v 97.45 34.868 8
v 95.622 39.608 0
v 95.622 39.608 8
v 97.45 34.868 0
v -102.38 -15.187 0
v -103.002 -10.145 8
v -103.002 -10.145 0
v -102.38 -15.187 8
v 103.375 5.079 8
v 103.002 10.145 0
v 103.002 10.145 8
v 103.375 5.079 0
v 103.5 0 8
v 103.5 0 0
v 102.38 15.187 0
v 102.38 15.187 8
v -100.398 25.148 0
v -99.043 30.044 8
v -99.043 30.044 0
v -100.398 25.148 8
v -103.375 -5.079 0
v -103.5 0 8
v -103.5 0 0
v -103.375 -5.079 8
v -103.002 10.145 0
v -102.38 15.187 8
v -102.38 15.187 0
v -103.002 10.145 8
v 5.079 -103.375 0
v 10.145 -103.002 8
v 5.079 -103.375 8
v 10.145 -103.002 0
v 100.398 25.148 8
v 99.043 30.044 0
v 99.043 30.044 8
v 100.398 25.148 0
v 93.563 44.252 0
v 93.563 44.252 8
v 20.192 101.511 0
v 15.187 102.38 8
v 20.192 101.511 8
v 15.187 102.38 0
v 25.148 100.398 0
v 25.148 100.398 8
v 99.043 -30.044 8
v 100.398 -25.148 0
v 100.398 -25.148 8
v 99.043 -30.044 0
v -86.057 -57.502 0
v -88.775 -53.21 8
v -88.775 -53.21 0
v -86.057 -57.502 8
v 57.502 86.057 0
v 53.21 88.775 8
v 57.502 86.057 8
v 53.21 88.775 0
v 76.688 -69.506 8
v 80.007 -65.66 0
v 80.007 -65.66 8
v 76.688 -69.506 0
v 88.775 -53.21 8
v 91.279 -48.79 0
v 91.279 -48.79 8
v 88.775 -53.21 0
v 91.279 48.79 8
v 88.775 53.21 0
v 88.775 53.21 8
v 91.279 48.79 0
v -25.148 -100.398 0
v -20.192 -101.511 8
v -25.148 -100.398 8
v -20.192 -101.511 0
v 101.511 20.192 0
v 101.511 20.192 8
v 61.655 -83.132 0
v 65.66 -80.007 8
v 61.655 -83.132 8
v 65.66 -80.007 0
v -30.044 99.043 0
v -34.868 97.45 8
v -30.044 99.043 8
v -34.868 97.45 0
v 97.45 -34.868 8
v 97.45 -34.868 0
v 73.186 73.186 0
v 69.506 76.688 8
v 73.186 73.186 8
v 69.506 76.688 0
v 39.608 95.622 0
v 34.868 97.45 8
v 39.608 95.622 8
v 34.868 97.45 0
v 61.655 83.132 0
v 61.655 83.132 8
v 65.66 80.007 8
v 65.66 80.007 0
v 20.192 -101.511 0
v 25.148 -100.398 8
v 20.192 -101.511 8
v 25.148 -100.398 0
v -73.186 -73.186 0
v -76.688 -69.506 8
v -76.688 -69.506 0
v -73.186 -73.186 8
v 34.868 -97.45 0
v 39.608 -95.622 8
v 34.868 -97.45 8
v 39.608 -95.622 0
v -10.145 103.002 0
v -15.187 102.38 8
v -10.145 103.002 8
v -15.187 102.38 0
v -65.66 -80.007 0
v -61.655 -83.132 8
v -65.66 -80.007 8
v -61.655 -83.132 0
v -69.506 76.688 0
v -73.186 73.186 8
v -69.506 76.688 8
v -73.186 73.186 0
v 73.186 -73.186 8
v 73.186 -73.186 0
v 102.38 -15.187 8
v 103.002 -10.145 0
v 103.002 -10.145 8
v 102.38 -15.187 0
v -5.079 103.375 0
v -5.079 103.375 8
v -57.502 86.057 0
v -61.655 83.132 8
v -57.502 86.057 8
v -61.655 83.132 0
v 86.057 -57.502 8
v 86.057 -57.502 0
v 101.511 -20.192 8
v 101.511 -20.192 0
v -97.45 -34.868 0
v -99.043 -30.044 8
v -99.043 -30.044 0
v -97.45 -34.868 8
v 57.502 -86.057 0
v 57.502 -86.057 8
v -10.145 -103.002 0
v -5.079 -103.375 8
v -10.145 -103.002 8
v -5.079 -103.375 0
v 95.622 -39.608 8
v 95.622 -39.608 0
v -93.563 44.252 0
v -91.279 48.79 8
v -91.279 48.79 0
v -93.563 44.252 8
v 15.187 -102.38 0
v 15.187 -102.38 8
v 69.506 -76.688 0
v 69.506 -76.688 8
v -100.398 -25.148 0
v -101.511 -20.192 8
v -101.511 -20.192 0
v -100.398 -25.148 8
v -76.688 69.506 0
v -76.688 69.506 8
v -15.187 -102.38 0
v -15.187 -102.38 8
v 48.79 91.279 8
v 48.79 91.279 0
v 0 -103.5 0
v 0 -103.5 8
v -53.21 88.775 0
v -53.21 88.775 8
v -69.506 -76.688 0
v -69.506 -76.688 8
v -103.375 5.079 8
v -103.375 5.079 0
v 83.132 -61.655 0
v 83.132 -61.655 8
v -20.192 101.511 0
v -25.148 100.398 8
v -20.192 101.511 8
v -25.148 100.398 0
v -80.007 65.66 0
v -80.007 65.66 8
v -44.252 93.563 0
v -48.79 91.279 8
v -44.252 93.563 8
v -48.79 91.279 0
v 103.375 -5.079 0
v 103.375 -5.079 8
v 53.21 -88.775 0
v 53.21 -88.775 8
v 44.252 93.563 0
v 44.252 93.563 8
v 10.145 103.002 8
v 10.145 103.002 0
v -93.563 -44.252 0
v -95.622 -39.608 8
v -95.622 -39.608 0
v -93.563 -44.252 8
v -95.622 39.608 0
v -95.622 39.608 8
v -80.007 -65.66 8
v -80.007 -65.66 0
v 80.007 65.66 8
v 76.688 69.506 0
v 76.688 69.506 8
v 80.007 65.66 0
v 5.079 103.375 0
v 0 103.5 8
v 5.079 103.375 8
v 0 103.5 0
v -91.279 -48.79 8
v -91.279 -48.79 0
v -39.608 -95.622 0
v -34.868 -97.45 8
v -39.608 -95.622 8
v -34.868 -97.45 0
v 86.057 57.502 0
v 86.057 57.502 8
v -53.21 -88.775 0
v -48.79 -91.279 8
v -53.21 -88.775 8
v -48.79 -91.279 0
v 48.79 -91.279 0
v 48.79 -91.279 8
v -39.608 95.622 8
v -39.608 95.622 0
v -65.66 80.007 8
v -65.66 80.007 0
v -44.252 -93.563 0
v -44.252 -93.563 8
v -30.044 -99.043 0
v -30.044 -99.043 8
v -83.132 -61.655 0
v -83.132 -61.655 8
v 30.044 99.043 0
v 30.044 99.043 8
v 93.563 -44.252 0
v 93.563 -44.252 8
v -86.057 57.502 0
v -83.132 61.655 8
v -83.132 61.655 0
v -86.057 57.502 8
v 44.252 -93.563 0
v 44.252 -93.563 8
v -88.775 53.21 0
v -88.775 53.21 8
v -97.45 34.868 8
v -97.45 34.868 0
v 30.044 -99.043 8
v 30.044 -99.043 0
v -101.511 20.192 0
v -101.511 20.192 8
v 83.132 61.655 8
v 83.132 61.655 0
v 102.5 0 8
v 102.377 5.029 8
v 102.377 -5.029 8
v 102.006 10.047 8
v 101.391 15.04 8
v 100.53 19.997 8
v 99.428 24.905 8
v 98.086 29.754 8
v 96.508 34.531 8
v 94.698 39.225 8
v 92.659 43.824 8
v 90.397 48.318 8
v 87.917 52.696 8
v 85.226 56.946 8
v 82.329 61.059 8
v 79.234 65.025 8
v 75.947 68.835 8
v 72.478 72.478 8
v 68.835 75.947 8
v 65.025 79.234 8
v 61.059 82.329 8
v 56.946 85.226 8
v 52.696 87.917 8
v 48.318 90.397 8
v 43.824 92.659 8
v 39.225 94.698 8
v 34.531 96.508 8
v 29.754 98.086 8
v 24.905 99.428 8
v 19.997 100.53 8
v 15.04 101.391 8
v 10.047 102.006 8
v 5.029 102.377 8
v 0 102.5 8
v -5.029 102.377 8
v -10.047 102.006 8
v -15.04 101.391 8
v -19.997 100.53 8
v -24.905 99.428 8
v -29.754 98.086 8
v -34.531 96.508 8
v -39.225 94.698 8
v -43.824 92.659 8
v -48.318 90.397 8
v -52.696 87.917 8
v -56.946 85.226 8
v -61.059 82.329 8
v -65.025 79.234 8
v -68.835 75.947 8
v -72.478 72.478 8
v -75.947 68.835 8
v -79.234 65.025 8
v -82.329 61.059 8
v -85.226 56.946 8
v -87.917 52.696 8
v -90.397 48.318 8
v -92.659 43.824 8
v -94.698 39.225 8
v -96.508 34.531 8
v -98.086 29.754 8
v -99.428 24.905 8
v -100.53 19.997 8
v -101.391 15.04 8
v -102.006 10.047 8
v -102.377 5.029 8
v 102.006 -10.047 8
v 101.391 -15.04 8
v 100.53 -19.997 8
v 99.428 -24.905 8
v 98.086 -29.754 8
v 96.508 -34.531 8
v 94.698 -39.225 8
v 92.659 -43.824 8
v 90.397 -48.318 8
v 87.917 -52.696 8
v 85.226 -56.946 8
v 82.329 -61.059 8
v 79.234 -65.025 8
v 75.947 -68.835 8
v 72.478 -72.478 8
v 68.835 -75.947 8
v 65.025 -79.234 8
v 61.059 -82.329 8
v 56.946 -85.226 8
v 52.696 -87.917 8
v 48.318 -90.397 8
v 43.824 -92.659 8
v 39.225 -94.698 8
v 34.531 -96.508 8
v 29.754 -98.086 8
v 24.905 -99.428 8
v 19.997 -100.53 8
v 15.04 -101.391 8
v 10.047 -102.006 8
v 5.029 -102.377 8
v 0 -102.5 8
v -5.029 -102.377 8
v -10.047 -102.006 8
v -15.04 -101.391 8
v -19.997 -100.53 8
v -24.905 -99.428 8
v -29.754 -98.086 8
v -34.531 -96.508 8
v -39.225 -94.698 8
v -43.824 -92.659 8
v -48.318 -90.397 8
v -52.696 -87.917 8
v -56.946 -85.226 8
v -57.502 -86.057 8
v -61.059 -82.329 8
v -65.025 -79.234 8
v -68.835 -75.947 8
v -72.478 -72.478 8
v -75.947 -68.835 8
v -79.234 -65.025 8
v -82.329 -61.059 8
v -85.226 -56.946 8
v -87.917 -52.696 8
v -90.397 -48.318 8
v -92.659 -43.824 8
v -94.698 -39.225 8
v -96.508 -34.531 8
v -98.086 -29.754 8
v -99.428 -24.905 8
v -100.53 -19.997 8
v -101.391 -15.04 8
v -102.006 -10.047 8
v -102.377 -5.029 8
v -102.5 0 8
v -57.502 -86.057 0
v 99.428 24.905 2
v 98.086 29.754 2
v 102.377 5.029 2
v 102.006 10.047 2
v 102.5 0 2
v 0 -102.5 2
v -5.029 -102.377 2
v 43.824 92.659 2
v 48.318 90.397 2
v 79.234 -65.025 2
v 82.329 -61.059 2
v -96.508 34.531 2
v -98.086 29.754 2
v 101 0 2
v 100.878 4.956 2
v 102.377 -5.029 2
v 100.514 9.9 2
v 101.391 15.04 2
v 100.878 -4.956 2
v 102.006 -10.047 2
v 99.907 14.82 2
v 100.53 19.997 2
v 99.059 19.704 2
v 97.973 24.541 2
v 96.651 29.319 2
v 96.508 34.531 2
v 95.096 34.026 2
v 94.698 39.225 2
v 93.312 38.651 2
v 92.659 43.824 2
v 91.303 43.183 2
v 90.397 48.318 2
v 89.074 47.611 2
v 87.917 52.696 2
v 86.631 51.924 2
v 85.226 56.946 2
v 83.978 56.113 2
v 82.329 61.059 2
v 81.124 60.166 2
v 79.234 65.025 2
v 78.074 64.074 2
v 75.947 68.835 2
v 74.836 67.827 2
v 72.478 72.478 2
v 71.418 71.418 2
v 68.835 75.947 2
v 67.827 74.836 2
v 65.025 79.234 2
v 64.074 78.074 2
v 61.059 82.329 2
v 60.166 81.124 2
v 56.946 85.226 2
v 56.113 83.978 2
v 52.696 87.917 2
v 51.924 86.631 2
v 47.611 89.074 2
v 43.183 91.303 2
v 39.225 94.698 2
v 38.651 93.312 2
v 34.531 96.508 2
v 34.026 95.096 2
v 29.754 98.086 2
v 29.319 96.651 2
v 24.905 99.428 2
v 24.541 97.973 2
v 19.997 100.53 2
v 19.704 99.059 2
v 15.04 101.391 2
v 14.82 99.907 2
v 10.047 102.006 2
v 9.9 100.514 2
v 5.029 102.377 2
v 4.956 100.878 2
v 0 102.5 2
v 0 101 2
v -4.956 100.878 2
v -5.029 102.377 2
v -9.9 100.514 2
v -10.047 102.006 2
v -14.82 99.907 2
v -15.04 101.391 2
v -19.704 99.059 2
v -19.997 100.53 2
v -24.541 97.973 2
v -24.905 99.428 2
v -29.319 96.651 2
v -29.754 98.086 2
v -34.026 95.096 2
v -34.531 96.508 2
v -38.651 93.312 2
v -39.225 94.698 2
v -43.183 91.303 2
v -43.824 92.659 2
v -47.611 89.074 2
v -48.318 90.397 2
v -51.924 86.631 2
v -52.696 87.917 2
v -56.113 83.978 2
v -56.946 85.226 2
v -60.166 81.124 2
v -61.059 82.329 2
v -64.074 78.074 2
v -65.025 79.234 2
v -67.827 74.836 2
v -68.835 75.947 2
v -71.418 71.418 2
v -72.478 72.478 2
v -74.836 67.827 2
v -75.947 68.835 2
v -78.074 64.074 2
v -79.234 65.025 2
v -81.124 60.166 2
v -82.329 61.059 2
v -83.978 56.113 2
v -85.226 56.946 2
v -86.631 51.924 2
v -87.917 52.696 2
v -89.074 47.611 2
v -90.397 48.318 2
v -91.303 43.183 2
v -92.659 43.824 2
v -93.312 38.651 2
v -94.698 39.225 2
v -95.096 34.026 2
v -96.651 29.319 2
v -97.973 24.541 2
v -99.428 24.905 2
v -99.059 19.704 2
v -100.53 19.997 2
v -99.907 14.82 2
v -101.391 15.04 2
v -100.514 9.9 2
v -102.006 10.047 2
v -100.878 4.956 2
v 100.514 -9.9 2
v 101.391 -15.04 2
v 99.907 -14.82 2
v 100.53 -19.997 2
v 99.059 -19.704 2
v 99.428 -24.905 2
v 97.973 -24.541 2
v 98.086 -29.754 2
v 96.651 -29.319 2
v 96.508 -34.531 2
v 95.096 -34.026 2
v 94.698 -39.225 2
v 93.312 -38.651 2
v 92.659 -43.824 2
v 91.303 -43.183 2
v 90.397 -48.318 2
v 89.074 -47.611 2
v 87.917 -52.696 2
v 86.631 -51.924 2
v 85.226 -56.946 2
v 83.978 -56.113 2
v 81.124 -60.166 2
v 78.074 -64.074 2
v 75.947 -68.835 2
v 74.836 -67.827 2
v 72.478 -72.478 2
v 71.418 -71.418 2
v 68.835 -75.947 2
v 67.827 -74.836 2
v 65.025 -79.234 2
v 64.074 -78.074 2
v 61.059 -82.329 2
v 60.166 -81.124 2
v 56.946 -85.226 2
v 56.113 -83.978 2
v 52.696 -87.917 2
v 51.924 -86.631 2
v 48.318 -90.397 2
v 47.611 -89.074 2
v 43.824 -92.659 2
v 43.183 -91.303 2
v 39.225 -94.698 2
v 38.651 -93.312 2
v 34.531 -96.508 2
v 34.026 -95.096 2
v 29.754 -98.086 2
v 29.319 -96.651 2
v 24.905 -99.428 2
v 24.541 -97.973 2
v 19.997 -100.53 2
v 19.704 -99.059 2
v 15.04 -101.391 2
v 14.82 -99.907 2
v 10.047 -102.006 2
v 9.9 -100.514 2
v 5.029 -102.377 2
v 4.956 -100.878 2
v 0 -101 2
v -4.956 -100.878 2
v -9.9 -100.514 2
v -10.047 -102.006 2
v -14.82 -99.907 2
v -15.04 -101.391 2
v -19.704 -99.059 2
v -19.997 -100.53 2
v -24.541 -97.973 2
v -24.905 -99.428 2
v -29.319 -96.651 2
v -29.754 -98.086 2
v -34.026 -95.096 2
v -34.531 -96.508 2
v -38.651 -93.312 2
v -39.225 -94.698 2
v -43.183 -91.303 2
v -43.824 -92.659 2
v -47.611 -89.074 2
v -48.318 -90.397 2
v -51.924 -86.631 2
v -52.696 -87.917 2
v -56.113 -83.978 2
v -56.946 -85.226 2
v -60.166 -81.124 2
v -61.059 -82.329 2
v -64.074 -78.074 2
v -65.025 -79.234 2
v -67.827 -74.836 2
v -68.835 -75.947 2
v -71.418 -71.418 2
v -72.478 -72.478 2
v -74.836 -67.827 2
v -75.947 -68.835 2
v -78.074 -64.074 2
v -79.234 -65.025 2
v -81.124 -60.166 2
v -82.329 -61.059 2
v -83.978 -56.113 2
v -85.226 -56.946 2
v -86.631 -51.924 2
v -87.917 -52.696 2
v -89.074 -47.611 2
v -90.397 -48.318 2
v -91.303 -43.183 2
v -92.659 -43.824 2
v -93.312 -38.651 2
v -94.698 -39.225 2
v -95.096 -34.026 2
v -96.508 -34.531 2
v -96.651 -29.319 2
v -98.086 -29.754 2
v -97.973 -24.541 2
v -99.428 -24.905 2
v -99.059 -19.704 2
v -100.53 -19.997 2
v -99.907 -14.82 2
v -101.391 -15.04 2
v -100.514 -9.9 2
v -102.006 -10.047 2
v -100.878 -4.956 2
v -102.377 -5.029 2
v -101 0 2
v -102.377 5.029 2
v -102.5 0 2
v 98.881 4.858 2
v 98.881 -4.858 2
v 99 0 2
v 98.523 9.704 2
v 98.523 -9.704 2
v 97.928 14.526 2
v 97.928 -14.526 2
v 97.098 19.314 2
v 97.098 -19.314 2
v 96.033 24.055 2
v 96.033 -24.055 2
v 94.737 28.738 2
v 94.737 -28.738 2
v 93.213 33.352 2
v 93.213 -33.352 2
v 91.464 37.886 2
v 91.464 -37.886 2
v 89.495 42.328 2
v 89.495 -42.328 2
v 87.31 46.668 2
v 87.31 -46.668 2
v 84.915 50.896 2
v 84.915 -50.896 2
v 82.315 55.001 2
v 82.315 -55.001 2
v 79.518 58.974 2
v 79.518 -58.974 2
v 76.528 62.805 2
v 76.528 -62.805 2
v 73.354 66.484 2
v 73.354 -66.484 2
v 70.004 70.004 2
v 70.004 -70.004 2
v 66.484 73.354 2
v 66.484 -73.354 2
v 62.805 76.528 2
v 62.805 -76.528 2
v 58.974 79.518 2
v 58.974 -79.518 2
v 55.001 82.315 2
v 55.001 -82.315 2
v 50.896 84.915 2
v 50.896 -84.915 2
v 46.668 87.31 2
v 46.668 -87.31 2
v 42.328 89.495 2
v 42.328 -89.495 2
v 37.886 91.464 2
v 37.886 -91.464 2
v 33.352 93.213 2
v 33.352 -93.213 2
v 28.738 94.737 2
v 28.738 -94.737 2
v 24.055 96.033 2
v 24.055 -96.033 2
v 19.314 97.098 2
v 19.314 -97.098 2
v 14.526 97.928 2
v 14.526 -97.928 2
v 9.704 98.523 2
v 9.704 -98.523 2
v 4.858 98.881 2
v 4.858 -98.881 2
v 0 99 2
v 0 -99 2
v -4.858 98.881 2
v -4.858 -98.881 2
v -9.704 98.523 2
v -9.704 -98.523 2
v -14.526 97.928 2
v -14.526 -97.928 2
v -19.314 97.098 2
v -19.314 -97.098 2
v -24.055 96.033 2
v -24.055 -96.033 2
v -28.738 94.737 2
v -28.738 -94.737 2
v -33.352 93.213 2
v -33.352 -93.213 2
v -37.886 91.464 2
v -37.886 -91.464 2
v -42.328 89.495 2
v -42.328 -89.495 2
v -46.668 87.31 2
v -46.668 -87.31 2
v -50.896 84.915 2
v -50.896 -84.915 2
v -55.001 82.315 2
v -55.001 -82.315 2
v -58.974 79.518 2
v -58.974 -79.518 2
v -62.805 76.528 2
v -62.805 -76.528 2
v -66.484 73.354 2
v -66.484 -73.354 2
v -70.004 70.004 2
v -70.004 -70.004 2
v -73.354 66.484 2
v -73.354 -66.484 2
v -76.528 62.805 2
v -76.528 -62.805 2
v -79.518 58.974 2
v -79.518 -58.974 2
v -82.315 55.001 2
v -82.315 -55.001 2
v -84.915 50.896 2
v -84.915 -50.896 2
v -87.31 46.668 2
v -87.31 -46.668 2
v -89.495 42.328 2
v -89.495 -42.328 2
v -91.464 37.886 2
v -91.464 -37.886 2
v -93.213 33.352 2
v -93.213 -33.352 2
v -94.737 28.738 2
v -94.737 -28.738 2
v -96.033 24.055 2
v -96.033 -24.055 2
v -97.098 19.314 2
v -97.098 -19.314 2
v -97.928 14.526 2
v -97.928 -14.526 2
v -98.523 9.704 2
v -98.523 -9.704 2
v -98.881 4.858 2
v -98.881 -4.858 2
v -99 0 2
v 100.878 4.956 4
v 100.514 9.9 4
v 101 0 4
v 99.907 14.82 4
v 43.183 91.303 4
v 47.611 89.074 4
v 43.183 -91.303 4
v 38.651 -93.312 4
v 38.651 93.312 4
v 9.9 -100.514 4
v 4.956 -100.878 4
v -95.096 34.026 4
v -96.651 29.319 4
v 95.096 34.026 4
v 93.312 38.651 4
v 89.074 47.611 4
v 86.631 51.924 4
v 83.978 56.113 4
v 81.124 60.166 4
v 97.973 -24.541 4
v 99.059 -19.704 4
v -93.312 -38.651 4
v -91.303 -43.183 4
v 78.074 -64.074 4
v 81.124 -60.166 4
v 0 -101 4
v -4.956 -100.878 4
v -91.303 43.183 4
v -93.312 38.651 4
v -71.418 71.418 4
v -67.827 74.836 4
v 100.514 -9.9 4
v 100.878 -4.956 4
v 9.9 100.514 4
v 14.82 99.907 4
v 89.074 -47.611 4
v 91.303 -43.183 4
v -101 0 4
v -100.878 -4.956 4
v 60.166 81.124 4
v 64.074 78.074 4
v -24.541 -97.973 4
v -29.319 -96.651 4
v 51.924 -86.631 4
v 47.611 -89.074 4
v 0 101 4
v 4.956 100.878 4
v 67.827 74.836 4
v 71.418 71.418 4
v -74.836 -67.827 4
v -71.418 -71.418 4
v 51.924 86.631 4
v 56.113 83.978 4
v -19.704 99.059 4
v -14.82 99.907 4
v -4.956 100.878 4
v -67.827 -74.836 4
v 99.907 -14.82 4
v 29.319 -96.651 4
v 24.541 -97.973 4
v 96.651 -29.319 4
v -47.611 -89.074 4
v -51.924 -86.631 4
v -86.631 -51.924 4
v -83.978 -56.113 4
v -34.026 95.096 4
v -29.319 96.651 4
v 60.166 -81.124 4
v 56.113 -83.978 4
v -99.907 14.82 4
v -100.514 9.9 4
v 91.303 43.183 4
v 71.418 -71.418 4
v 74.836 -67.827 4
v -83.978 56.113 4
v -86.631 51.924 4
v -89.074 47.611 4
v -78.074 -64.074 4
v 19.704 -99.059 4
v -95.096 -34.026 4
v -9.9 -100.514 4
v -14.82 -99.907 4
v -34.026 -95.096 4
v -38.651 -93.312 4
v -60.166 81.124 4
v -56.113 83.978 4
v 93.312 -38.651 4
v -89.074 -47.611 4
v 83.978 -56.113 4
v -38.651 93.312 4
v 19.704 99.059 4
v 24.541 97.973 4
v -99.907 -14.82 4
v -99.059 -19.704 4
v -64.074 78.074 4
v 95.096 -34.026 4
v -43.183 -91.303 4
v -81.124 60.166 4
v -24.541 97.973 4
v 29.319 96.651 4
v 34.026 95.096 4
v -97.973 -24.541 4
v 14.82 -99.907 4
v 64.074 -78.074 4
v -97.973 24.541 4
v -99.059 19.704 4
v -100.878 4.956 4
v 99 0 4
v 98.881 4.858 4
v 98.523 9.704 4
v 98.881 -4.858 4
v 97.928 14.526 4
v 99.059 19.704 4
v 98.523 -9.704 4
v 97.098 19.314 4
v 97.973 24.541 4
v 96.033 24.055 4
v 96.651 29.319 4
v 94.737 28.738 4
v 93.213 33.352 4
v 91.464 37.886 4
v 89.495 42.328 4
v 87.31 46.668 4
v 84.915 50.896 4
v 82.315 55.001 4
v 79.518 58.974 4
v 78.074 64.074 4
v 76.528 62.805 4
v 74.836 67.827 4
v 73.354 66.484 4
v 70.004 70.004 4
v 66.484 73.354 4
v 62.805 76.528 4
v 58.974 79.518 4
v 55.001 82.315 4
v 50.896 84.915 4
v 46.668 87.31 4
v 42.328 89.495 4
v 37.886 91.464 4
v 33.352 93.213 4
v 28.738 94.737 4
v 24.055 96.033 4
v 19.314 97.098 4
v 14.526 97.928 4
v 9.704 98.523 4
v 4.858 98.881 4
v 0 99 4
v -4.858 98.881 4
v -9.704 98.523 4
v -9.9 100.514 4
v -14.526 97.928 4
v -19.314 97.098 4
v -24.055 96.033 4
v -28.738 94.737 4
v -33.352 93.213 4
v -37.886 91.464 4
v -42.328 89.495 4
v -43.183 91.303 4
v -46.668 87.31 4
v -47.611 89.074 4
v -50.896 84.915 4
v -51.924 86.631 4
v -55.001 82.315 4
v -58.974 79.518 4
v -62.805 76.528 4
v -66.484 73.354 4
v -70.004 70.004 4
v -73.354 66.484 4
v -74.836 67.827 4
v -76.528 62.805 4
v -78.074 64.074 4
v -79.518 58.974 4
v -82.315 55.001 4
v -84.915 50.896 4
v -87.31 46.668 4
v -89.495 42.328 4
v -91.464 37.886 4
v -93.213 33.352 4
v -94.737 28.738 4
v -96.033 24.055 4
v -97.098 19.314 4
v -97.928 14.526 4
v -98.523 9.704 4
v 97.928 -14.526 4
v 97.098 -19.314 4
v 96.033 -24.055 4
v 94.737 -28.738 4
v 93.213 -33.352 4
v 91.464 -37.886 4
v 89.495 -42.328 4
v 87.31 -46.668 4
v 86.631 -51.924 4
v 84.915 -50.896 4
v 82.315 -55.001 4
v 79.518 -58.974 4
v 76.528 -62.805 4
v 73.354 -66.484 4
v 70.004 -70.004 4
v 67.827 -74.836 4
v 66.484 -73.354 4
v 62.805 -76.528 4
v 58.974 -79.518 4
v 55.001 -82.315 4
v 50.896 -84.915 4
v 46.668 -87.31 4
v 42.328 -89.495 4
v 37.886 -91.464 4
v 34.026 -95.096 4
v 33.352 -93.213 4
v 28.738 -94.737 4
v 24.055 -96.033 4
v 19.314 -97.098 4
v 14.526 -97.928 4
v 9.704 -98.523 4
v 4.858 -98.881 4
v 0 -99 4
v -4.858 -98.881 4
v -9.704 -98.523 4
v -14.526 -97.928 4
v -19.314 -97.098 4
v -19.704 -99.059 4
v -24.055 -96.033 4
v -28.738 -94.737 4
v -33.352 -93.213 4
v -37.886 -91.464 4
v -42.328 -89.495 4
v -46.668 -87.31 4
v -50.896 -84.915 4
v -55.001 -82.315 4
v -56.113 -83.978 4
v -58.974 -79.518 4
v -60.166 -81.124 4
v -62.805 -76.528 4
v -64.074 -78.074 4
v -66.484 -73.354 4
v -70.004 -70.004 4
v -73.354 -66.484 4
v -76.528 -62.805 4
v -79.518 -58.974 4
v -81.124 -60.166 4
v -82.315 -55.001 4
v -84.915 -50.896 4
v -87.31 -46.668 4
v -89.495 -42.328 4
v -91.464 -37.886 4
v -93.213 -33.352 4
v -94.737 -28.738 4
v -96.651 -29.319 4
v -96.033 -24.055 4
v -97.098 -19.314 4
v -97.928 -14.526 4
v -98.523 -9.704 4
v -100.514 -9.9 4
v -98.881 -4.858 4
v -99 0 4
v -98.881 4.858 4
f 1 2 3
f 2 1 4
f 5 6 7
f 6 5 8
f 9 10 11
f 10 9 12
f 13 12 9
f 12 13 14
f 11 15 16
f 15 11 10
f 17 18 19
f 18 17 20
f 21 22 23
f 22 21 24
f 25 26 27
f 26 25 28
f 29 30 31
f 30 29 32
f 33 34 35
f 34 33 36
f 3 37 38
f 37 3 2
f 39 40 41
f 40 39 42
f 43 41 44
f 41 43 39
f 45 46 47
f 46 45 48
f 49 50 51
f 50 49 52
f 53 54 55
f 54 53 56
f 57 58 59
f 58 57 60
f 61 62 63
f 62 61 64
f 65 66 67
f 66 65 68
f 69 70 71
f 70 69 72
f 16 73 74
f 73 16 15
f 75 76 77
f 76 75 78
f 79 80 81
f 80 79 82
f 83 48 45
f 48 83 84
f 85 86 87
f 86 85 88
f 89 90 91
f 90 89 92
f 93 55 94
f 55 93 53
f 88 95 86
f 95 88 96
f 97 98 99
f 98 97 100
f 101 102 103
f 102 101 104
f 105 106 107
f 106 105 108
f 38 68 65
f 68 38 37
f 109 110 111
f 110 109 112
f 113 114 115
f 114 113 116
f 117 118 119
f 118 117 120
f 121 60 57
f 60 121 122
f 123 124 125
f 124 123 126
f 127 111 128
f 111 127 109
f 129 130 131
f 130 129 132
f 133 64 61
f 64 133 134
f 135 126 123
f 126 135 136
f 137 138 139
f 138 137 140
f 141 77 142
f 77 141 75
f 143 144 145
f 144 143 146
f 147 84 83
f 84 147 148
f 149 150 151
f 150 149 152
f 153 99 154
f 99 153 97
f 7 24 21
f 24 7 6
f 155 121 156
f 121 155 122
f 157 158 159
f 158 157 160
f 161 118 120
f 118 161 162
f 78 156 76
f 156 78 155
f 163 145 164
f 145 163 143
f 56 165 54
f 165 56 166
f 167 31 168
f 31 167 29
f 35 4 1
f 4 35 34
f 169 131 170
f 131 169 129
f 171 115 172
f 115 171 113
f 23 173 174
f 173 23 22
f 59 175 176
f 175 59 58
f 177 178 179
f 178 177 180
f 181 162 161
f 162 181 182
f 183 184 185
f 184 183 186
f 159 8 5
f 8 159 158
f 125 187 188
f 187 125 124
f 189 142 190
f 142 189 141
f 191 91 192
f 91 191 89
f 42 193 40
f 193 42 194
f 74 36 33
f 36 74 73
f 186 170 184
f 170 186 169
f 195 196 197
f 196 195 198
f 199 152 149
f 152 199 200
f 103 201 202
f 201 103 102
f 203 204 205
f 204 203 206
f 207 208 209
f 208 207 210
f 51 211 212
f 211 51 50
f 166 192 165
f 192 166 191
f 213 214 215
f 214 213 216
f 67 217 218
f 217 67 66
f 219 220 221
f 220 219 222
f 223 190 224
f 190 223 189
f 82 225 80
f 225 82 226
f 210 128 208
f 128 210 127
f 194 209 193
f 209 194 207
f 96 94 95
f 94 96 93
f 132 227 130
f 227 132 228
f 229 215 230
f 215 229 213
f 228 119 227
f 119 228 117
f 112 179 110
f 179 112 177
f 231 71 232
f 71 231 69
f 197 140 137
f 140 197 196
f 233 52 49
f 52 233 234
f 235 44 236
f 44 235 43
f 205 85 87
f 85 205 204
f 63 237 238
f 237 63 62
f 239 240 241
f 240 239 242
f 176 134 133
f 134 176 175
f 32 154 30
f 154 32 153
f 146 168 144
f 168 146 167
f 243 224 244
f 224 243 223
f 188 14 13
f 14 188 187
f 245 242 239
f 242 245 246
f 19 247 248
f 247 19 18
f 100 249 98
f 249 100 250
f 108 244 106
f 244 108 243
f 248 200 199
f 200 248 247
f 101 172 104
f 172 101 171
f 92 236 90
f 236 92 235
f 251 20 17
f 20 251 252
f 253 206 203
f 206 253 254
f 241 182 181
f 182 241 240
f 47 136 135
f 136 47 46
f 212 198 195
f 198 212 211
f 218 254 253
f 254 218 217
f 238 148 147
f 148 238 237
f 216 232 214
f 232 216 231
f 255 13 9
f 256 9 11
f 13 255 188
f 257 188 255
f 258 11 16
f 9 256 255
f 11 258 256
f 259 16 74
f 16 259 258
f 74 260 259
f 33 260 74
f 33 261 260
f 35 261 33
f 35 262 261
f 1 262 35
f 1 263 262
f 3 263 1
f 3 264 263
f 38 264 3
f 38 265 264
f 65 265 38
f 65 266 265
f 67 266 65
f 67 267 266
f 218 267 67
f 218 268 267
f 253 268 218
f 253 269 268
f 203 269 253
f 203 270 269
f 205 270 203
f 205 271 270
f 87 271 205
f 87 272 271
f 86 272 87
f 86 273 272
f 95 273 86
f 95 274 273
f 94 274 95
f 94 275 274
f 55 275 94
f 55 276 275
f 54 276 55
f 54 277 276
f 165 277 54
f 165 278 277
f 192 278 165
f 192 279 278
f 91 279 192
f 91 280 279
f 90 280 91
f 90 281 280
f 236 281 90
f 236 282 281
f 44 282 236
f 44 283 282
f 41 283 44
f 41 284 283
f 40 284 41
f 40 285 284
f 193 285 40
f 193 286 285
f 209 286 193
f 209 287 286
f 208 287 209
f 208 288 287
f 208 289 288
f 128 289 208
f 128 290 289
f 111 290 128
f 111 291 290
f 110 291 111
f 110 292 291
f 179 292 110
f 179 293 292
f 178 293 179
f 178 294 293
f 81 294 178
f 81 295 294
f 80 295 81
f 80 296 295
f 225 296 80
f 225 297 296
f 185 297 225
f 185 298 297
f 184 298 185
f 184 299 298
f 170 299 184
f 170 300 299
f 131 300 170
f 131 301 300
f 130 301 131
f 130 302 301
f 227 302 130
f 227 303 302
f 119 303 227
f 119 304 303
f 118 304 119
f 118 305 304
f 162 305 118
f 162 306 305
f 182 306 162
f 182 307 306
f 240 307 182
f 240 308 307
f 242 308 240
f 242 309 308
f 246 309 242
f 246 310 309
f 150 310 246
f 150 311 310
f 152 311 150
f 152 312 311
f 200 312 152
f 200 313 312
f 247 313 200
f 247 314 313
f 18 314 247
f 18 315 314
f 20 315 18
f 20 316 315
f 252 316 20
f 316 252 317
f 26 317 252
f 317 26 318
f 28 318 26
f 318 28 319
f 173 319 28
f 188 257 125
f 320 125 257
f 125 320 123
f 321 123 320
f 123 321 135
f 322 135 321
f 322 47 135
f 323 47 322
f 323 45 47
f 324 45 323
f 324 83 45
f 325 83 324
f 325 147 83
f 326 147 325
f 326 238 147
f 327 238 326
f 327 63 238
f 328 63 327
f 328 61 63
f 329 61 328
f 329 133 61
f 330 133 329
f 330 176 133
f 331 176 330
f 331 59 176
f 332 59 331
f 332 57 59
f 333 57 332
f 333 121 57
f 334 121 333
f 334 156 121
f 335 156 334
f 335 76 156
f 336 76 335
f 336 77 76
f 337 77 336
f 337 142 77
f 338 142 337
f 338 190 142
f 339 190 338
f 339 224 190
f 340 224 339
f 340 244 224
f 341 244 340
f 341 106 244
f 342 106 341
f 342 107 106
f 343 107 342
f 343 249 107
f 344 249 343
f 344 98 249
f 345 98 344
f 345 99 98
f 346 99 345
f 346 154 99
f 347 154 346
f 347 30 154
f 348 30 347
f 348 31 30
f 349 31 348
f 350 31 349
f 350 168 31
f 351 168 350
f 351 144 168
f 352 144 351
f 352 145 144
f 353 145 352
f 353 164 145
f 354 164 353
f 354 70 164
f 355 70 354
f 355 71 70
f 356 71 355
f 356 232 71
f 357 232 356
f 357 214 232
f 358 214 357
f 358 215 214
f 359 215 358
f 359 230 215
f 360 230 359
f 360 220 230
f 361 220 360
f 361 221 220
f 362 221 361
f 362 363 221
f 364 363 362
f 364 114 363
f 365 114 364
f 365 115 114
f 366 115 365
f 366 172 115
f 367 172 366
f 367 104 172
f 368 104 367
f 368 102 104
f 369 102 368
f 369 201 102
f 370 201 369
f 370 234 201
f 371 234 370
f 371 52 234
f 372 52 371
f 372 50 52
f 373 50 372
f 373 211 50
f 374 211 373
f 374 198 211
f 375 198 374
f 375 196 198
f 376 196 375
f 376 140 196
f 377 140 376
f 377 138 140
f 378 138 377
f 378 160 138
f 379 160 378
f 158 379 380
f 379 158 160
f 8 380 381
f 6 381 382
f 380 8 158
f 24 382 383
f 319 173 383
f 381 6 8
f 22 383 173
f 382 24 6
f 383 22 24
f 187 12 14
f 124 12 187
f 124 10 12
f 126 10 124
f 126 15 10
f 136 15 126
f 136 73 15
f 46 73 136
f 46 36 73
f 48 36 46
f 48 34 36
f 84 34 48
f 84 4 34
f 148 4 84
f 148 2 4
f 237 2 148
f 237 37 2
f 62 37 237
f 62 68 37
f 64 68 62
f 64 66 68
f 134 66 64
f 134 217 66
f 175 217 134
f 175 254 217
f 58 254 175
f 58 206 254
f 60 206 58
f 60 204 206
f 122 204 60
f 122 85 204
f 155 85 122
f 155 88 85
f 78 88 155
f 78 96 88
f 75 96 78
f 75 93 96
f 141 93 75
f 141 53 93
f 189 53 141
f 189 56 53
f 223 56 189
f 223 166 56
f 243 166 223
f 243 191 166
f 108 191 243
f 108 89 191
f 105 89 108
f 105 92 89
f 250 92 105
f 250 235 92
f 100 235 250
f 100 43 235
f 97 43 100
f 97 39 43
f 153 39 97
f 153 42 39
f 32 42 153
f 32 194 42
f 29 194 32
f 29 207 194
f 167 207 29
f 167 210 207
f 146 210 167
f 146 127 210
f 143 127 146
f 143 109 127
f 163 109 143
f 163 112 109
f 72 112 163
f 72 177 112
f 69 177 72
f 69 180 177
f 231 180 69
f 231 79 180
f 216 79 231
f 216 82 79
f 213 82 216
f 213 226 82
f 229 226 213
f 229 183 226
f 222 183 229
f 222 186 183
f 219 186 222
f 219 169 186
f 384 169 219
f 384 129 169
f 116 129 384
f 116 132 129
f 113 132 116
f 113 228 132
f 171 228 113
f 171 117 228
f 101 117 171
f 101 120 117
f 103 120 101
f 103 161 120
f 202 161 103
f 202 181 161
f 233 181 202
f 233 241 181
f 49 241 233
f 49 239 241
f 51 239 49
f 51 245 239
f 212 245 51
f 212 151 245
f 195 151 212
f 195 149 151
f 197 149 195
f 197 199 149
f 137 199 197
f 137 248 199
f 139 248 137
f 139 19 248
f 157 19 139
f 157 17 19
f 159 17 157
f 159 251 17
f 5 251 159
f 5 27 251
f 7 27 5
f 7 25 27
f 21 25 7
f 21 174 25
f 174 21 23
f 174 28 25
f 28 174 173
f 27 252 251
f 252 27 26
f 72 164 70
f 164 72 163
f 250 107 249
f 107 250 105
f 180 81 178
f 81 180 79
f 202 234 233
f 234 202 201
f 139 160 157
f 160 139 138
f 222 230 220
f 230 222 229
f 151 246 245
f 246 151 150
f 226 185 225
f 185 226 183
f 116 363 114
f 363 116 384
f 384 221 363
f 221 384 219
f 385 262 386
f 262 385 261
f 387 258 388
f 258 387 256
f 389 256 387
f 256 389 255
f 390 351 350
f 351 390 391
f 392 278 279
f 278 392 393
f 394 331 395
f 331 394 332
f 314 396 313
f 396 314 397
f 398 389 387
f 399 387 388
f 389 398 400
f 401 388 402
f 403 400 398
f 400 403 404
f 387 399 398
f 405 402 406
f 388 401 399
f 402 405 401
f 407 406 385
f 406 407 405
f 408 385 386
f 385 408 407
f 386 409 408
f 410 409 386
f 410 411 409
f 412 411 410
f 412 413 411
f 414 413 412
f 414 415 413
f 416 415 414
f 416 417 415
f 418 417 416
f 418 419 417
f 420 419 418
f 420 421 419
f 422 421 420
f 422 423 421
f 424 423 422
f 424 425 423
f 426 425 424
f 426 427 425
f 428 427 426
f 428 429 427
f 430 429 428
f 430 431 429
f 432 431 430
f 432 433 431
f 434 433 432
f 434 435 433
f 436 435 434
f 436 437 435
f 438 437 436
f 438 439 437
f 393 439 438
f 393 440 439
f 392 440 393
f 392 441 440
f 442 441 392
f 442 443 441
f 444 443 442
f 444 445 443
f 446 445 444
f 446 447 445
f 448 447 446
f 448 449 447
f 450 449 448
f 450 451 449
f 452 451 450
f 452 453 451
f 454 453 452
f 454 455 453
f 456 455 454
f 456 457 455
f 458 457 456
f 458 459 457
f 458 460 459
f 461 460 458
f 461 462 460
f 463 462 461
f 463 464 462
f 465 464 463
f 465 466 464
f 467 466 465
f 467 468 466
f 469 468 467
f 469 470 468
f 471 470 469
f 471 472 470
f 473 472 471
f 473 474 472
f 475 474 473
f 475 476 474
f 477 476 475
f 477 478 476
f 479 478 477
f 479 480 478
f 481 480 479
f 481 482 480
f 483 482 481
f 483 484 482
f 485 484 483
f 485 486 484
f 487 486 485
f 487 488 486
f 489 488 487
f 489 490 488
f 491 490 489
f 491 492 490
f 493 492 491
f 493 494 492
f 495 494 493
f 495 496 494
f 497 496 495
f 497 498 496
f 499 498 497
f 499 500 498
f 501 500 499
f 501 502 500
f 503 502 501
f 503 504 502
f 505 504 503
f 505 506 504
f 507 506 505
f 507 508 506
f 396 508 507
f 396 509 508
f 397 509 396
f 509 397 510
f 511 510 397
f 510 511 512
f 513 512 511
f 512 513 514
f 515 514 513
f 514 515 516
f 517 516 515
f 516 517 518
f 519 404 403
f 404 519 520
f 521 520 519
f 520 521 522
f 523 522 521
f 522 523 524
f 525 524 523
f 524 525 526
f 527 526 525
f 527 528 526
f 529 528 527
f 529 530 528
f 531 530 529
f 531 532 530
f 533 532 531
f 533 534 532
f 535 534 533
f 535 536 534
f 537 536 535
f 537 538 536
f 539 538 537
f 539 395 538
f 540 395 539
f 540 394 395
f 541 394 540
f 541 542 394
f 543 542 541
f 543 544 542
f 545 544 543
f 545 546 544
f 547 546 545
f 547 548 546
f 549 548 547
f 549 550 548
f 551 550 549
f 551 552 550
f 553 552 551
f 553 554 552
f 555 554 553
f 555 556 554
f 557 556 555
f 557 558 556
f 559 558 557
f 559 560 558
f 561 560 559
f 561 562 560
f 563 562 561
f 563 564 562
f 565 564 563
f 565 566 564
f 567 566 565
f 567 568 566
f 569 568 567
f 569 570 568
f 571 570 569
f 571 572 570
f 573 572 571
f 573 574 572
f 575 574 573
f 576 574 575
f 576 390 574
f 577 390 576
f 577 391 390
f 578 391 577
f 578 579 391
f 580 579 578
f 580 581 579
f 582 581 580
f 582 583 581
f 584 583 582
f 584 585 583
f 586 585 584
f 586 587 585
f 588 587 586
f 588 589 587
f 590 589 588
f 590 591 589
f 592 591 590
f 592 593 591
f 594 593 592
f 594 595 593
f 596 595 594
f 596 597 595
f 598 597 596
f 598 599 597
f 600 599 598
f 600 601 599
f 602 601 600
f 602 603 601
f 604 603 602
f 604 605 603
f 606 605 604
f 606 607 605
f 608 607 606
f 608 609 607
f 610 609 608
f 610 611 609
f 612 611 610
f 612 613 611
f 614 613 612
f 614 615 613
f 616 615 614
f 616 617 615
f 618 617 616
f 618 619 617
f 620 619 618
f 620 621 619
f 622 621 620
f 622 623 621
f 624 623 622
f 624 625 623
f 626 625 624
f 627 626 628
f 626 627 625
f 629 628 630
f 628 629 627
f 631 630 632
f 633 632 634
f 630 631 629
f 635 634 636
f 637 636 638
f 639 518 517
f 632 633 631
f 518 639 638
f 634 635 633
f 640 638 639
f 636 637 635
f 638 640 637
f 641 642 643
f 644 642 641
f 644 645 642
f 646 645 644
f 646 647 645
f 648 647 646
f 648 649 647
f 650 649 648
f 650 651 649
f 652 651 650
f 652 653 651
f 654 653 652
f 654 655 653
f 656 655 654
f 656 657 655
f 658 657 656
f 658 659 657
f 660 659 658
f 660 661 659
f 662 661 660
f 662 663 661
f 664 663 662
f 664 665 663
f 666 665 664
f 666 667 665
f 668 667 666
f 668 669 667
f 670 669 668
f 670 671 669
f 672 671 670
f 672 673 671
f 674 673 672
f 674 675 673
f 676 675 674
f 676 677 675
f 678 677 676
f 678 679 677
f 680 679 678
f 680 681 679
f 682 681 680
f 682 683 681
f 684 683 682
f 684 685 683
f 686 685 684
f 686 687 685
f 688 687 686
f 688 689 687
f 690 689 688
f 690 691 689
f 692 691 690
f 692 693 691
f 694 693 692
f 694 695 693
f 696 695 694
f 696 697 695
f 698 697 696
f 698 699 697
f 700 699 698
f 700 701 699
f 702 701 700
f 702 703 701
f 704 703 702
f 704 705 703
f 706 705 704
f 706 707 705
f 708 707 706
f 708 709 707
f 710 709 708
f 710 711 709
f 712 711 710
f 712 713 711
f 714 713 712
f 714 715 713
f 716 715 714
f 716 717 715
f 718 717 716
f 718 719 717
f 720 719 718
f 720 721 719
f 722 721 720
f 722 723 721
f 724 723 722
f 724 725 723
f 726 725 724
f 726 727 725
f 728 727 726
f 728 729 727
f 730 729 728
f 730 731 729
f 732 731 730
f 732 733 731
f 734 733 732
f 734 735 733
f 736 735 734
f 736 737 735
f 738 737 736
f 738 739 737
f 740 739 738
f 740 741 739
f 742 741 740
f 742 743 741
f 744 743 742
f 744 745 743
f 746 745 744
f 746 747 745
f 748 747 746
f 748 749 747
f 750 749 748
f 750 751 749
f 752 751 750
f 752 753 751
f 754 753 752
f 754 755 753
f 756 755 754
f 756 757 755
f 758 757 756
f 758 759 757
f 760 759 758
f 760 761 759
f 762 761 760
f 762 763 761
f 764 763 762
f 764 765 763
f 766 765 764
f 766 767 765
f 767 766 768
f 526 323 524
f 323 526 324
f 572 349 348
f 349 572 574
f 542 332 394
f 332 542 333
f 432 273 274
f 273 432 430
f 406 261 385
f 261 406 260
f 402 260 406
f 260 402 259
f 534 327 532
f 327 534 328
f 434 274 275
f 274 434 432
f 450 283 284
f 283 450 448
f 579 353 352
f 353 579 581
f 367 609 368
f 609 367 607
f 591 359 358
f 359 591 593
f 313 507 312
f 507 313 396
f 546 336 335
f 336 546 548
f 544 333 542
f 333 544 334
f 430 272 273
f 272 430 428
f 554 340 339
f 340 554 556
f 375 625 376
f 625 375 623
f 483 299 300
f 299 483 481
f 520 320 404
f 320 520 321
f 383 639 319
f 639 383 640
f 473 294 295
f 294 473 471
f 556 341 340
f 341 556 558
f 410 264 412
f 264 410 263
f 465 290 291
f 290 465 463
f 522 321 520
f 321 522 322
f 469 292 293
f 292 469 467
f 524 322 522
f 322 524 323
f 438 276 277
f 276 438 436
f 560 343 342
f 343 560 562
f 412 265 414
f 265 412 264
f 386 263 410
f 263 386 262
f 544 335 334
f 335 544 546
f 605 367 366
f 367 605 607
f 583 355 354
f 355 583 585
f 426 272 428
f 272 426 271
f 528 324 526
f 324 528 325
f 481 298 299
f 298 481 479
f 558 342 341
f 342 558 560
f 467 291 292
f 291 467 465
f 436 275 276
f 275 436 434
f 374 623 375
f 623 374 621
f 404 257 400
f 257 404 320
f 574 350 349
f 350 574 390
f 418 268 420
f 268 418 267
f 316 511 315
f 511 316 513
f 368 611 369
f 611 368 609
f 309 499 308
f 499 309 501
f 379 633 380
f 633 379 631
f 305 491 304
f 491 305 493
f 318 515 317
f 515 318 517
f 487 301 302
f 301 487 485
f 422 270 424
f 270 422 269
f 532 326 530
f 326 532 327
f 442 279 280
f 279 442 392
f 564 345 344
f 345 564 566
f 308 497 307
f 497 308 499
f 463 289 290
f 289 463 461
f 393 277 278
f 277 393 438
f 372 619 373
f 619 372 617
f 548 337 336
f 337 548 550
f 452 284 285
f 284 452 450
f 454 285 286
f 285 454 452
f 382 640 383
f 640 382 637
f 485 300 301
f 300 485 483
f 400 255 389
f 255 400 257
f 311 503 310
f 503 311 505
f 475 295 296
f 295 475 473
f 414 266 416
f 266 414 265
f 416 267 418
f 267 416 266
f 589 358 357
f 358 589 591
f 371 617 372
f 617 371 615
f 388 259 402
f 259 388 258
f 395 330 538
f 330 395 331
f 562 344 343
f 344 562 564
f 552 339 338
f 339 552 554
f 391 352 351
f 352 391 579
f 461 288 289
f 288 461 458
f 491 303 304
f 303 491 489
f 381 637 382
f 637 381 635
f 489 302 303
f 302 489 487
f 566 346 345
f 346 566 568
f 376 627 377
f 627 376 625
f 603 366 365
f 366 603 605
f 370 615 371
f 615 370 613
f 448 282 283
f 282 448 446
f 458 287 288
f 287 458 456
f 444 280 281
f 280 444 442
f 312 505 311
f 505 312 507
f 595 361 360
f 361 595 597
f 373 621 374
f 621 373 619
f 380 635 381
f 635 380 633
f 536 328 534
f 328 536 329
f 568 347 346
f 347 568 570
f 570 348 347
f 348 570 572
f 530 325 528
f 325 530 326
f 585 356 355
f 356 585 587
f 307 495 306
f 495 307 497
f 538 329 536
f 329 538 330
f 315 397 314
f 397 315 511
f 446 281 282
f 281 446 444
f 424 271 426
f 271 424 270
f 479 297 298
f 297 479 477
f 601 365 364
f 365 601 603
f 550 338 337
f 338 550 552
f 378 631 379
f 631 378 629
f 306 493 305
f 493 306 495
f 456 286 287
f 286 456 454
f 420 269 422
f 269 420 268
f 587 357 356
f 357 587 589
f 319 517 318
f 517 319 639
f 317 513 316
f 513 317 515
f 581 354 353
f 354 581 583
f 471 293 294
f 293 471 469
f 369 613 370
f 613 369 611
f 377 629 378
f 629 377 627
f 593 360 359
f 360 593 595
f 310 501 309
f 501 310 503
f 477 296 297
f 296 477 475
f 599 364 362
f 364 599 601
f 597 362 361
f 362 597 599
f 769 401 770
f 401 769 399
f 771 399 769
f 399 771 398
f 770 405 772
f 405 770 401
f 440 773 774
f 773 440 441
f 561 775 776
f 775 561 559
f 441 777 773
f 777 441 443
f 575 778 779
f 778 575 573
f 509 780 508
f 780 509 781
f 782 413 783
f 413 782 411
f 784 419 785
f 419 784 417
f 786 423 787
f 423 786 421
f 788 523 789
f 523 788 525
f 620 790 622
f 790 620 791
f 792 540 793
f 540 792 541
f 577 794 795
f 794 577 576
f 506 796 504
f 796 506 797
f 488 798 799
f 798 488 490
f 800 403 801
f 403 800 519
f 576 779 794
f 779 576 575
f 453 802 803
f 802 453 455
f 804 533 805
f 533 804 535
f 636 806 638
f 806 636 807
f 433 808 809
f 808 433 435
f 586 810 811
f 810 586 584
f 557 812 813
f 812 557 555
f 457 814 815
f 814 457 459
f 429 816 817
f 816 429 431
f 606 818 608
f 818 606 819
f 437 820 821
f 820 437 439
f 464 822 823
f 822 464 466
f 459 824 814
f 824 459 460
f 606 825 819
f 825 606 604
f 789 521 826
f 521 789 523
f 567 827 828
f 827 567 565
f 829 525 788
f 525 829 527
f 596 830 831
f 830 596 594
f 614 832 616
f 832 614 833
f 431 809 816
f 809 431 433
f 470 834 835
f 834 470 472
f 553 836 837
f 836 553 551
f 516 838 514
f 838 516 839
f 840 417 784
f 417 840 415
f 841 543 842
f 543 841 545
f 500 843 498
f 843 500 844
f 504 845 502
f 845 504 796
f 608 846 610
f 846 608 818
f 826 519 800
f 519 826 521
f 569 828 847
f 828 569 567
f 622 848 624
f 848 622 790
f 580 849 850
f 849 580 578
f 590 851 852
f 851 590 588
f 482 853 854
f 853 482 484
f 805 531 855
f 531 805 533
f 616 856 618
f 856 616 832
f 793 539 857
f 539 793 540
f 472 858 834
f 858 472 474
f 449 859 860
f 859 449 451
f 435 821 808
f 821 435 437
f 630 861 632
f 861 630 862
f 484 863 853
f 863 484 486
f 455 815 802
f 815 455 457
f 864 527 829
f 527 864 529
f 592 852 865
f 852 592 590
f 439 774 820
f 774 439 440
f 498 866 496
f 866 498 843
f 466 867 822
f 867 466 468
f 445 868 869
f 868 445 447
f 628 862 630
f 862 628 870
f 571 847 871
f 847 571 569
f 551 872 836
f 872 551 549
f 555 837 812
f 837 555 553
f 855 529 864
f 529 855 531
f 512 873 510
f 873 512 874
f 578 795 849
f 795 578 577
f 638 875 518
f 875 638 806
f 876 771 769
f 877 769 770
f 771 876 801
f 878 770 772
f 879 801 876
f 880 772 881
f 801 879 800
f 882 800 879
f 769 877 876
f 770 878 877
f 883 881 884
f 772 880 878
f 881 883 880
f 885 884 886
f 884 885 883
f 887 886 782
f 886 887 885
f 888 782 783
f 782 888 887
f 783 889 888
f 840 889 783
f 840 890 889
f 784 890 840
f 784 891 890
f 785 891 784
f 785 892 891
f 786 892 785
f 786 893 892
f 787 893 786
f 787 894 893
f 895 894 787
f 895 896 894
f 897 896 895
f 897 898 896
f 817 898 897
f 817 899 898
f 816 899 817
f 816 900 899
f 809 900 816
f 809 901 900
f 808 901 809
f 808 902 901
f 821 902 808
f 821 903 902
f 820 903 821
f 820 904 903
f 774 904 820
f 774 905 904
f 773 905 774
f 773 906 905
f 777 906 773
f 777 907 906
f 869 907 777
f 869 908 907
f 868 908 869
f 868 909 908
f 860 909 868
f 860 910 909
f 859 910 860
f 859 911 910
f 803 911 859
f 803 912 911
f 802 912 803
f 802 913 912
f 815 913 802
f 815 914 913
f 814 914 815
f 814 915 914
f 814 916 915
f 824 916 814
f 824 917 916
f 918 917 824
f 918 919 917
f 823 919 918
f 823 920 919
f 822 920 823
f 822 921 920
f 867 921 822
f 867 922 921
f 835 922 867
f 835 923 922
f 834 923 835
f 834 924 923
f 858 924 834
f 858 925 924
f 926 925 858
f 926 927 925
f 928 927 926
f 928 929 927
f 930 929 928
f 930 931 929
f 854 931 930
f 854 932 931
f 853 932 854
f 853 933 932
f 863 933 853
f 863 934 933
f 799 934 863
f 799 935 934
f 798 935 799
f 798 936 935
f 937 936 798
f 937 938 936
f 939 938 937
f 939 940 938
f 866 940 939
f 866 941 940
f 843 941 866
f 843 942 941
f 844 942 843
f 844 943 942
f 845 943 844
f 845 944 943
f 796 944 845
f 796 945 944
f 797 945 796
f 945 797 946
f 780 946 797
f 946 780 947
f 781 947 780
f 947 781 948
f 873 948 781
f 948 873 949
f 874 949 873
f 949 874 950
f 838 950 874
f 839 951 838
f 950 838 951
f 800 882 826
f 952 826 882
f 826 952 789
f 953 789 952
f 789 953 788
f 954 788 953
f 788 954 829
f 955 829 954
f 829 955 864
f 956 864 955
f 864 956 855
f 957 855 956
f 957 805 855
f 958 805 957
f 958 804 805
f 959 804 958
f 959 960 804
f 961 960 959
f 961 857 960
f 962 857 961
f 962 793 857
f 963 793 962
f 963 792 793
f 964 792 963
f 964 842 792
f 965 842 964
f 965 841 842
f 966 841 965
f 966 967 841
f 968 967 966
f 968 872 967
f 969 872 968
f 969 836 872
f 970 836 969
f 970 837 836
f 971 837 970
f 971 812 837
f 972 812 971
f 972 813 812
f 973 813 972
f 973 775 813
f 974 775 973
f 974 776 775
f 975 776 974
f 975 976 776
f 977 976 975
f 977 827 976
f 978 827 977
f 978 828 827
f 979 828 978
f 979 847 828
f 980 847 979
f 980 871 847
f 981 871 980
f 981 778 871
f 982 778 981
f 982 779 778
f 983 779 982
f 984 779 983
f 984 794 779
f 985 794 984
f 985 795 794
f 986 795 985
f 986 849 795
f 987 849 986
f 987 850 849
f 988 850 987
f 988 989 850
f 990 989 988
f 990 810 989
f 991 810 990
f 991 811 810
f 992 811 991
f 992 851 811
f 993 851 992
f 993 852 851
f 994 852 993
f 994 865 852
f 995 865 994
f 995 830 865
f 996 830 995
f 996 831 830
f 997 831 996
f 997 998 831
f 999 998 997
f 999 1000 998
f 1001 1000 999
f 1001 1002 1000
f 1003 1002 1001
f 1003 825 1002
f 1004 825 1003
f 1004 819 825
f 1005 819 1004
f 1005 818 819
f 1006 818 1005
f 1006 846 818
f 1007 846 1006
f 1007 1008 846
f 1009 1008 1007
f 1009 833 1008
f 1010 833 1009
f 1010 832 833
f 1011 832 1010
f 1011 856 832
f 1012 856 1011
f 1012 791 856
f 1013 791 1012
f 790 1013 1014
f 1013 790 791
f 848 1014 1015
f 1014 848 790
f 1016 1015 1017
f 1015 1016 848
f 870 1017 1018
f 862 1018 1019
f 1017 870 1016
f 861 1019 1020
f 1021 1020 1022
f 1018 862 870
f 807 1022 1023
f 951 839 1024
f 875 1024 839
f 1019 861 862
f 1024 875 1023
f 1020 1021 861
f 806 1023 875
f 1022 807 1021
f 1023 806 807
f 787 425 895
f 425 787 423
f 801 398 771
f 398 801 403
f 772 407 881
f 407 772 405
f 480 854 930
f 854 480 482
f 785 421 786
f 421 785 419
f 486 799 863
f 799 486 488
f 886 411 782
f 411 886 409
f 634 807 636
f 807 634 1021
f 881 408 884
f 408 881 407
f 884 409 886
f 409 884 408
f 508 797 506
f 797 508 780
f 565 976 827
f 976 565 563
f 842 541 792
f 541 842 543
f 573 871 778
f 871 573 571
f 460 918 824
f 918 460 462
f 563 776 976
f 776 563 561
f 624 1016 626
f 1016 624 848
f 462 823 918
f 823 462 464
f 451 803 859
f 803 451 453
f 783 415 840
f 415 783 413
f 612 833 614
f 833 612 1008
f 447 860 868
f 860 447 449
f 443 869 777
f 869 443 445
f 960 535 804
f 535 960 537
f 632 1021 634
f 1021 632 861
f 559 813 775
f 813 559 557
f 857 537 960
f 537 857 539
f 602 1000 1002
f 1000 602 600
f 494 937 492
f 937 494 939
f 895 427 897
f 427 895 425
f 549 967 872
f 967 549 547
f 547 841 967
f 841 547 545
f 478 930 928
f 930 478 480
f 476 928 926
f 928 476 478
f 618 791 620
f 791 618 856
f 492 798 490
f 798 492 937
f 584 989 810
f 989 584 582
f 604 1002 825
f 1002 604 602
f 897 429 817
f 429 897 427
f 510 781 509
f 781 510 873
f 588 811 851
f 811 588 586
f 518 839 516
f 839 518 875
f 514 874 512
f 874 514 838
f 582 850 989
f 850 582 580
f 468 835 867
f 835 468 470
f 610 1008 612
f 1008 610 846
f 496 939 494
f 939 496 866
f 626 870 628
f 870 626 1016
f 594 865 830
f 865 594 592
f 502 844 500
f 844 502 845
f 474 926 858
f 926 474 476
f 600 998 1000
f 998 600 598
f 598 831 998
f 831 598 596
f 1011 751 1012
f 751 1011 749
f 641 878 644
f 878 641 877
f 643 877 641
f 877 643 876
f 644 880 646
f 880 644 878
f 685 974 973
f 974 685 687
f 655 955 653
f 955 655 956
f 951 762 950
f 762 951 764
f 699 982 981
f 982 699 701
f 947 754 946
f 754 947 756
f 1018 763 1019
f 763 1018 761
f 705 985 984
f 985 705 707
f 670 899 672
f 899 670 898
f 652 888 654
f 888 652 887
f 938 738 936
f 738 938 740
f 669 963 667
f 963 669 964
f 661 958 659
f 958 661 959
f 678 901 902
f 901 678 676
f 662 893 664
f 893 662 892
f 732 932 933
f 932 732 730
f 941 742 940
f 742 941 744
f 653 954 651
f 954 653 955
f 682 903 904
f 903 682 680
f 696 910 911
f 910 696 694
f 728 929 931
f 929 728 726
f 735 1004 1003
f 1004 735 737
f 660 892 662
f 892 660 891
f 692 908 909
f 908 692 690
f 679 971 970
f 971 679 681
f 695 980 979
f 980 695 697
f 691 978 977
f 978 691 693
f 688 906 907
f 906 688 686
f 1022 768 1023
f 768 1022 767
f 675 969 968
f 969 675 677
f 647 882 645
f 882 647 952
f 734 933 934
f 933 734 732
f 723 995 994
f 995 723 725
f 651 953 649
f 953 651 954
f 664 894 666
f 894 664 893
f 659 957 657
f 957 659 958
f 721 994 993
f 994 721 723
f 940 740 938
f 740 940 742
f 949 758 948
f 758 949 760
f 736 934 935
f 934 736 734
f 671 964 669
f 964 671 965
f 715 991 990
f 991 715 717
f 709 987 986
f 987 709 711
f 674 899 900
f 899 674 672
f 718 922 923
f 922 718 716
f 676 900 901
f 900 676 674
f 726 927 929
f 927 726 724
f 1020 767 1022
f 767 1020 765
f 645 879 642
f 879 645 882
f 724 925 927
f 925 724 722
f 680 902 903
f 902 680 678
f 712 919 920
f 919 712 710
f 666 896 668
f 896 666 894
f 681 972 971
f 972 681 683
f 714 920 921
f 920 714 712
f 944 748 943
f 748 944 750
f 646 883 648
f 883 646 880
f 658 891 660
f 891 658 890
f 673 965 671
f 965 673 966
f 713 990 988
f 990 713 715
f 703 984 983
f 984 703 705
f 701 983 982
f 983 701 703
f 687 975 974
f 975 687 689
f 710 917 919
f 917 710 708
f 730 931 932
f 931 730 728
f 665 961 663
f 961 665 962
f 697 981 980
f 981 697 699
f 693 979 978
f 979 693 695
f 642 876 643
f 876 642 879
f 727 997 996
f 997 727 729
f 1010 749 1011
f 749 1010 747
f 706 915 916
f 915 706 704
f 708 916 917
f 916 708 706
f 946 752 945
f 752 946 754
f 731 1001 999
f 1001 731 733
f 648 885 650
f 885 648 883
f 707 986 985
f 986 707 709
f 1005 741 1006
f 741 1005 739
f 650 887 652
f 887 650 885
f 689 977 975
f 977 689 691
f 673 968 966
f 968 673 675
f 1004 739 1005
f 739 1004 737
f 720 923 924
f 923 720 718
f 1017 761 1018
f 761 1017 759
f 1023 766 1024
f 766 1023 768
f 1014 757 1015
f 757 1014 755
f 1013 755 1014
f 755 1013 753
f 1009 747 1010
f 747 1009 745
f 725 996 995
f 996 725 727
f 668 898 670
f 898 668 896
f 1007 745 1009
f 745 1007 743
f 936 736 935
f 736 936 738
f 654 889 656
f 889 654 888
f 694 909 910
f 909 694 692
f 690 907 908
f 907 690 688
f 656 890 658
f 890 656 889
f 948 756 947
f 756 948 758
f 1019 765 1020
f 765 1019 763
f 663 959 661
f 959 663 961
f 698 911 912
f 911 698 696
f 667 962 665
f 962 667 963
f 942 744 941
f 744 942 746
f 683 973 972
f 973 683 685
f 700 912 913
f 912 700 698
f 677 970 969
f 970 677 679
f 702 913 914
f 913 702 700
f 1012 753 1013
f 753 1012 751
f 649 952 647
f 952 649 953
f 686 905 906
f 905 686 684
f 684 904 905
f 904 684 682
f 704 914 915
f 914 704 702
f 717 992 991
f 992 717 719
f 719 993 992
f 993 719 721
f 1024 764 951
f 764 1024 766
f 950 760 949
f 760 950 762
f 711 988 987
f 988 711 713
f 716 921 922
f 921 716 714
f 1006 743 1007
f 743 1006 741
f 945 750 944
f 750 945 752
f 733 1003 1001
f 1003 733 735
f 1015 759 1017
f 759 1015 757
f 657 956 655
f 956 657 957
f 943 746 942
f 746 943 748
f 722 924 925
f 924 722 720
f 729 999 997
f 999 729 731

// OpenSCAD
//
// cake cover - cylinder section
//

pmax = 220;			/* max print size */

mm = 25.4;			/* mm/inch */
$fn = 128;

// real dims
id = 203;			/* close to 8 inches */
high = 2.5*mm;
join = 10;			/* shiplap joint height */

// // for testing
// id = 20;			/* close to 8 inches */
// high = 15;
// join = 5;

taper = 5;

wall = 2;			/* wall thickness */
gap = 0.2;			/* non-interference for joint */

e = 1;

module cyl() {
     difference() {
	  // main cylinder and top joint
	  union() {
	       // main cylinder
	       cylinder( h=high-join, d=id+2*wall);
	       // top lip
	       translate( [0, 0, high-join-e])
		    cylinder( h=join+e, d=id+wall-2*gap);
	  }
	  translate( [0, 0, -e]) {
	       cylinder( h=high+2*e, d=id);
	       // shelf for flange to fit it
	       cylinder( h=e+join, d=id+wall);
	       // taper
	       translate( [0, 0, e+join-0.01])
		    cylinder( h=taper, d2=id, d1=id+wall);
	  }
     }
}

pthick = 2;
pdiam = 210;

module plat() {
     difference() {
	  union() {
	       cylinder( h=pthick, d=pdiam);
	       cylinder( h=pthick*2, d=id+2*wall-3*e);
	  }
	  translate( [0, 0, pthick])
	       cylinder( h=pthick-3, d=id-10);
	  // cut out to speed fab
//	  translate( [0, 0, -5])
//	       cylinder( h=20, d=pdiam-10);
     }
}

module top() {
     union() {
	  difference() {
	       cylinder( h=pthick*4, d=id+2*wall);
	       translate( [0, 0, pthick])
		    cylinder( h=pthick*4, d=id+wall);
	       
	  }
	  difference() {
	       cylinder ( h=pthick*2, d=id-e);
	       translate( [0, 0, pthick])
		    cylinder( h=pthick*4, d=id-5);
	  }
     }
}


module drawit() {
//     color("blue") plat();
//     translate([0,0,3]) cyl();
//     translate( [0, 0, high+2.5])
//	  rotate( [180, 0, 0])
//	  cyl();
     top();
}

// // cross-section
// difference() {
//      drawit();
//      translate( [-id/2-5, 0, -e])
//      cube( [id+25, 2*id+25, high+20]);
// }

drawit();
